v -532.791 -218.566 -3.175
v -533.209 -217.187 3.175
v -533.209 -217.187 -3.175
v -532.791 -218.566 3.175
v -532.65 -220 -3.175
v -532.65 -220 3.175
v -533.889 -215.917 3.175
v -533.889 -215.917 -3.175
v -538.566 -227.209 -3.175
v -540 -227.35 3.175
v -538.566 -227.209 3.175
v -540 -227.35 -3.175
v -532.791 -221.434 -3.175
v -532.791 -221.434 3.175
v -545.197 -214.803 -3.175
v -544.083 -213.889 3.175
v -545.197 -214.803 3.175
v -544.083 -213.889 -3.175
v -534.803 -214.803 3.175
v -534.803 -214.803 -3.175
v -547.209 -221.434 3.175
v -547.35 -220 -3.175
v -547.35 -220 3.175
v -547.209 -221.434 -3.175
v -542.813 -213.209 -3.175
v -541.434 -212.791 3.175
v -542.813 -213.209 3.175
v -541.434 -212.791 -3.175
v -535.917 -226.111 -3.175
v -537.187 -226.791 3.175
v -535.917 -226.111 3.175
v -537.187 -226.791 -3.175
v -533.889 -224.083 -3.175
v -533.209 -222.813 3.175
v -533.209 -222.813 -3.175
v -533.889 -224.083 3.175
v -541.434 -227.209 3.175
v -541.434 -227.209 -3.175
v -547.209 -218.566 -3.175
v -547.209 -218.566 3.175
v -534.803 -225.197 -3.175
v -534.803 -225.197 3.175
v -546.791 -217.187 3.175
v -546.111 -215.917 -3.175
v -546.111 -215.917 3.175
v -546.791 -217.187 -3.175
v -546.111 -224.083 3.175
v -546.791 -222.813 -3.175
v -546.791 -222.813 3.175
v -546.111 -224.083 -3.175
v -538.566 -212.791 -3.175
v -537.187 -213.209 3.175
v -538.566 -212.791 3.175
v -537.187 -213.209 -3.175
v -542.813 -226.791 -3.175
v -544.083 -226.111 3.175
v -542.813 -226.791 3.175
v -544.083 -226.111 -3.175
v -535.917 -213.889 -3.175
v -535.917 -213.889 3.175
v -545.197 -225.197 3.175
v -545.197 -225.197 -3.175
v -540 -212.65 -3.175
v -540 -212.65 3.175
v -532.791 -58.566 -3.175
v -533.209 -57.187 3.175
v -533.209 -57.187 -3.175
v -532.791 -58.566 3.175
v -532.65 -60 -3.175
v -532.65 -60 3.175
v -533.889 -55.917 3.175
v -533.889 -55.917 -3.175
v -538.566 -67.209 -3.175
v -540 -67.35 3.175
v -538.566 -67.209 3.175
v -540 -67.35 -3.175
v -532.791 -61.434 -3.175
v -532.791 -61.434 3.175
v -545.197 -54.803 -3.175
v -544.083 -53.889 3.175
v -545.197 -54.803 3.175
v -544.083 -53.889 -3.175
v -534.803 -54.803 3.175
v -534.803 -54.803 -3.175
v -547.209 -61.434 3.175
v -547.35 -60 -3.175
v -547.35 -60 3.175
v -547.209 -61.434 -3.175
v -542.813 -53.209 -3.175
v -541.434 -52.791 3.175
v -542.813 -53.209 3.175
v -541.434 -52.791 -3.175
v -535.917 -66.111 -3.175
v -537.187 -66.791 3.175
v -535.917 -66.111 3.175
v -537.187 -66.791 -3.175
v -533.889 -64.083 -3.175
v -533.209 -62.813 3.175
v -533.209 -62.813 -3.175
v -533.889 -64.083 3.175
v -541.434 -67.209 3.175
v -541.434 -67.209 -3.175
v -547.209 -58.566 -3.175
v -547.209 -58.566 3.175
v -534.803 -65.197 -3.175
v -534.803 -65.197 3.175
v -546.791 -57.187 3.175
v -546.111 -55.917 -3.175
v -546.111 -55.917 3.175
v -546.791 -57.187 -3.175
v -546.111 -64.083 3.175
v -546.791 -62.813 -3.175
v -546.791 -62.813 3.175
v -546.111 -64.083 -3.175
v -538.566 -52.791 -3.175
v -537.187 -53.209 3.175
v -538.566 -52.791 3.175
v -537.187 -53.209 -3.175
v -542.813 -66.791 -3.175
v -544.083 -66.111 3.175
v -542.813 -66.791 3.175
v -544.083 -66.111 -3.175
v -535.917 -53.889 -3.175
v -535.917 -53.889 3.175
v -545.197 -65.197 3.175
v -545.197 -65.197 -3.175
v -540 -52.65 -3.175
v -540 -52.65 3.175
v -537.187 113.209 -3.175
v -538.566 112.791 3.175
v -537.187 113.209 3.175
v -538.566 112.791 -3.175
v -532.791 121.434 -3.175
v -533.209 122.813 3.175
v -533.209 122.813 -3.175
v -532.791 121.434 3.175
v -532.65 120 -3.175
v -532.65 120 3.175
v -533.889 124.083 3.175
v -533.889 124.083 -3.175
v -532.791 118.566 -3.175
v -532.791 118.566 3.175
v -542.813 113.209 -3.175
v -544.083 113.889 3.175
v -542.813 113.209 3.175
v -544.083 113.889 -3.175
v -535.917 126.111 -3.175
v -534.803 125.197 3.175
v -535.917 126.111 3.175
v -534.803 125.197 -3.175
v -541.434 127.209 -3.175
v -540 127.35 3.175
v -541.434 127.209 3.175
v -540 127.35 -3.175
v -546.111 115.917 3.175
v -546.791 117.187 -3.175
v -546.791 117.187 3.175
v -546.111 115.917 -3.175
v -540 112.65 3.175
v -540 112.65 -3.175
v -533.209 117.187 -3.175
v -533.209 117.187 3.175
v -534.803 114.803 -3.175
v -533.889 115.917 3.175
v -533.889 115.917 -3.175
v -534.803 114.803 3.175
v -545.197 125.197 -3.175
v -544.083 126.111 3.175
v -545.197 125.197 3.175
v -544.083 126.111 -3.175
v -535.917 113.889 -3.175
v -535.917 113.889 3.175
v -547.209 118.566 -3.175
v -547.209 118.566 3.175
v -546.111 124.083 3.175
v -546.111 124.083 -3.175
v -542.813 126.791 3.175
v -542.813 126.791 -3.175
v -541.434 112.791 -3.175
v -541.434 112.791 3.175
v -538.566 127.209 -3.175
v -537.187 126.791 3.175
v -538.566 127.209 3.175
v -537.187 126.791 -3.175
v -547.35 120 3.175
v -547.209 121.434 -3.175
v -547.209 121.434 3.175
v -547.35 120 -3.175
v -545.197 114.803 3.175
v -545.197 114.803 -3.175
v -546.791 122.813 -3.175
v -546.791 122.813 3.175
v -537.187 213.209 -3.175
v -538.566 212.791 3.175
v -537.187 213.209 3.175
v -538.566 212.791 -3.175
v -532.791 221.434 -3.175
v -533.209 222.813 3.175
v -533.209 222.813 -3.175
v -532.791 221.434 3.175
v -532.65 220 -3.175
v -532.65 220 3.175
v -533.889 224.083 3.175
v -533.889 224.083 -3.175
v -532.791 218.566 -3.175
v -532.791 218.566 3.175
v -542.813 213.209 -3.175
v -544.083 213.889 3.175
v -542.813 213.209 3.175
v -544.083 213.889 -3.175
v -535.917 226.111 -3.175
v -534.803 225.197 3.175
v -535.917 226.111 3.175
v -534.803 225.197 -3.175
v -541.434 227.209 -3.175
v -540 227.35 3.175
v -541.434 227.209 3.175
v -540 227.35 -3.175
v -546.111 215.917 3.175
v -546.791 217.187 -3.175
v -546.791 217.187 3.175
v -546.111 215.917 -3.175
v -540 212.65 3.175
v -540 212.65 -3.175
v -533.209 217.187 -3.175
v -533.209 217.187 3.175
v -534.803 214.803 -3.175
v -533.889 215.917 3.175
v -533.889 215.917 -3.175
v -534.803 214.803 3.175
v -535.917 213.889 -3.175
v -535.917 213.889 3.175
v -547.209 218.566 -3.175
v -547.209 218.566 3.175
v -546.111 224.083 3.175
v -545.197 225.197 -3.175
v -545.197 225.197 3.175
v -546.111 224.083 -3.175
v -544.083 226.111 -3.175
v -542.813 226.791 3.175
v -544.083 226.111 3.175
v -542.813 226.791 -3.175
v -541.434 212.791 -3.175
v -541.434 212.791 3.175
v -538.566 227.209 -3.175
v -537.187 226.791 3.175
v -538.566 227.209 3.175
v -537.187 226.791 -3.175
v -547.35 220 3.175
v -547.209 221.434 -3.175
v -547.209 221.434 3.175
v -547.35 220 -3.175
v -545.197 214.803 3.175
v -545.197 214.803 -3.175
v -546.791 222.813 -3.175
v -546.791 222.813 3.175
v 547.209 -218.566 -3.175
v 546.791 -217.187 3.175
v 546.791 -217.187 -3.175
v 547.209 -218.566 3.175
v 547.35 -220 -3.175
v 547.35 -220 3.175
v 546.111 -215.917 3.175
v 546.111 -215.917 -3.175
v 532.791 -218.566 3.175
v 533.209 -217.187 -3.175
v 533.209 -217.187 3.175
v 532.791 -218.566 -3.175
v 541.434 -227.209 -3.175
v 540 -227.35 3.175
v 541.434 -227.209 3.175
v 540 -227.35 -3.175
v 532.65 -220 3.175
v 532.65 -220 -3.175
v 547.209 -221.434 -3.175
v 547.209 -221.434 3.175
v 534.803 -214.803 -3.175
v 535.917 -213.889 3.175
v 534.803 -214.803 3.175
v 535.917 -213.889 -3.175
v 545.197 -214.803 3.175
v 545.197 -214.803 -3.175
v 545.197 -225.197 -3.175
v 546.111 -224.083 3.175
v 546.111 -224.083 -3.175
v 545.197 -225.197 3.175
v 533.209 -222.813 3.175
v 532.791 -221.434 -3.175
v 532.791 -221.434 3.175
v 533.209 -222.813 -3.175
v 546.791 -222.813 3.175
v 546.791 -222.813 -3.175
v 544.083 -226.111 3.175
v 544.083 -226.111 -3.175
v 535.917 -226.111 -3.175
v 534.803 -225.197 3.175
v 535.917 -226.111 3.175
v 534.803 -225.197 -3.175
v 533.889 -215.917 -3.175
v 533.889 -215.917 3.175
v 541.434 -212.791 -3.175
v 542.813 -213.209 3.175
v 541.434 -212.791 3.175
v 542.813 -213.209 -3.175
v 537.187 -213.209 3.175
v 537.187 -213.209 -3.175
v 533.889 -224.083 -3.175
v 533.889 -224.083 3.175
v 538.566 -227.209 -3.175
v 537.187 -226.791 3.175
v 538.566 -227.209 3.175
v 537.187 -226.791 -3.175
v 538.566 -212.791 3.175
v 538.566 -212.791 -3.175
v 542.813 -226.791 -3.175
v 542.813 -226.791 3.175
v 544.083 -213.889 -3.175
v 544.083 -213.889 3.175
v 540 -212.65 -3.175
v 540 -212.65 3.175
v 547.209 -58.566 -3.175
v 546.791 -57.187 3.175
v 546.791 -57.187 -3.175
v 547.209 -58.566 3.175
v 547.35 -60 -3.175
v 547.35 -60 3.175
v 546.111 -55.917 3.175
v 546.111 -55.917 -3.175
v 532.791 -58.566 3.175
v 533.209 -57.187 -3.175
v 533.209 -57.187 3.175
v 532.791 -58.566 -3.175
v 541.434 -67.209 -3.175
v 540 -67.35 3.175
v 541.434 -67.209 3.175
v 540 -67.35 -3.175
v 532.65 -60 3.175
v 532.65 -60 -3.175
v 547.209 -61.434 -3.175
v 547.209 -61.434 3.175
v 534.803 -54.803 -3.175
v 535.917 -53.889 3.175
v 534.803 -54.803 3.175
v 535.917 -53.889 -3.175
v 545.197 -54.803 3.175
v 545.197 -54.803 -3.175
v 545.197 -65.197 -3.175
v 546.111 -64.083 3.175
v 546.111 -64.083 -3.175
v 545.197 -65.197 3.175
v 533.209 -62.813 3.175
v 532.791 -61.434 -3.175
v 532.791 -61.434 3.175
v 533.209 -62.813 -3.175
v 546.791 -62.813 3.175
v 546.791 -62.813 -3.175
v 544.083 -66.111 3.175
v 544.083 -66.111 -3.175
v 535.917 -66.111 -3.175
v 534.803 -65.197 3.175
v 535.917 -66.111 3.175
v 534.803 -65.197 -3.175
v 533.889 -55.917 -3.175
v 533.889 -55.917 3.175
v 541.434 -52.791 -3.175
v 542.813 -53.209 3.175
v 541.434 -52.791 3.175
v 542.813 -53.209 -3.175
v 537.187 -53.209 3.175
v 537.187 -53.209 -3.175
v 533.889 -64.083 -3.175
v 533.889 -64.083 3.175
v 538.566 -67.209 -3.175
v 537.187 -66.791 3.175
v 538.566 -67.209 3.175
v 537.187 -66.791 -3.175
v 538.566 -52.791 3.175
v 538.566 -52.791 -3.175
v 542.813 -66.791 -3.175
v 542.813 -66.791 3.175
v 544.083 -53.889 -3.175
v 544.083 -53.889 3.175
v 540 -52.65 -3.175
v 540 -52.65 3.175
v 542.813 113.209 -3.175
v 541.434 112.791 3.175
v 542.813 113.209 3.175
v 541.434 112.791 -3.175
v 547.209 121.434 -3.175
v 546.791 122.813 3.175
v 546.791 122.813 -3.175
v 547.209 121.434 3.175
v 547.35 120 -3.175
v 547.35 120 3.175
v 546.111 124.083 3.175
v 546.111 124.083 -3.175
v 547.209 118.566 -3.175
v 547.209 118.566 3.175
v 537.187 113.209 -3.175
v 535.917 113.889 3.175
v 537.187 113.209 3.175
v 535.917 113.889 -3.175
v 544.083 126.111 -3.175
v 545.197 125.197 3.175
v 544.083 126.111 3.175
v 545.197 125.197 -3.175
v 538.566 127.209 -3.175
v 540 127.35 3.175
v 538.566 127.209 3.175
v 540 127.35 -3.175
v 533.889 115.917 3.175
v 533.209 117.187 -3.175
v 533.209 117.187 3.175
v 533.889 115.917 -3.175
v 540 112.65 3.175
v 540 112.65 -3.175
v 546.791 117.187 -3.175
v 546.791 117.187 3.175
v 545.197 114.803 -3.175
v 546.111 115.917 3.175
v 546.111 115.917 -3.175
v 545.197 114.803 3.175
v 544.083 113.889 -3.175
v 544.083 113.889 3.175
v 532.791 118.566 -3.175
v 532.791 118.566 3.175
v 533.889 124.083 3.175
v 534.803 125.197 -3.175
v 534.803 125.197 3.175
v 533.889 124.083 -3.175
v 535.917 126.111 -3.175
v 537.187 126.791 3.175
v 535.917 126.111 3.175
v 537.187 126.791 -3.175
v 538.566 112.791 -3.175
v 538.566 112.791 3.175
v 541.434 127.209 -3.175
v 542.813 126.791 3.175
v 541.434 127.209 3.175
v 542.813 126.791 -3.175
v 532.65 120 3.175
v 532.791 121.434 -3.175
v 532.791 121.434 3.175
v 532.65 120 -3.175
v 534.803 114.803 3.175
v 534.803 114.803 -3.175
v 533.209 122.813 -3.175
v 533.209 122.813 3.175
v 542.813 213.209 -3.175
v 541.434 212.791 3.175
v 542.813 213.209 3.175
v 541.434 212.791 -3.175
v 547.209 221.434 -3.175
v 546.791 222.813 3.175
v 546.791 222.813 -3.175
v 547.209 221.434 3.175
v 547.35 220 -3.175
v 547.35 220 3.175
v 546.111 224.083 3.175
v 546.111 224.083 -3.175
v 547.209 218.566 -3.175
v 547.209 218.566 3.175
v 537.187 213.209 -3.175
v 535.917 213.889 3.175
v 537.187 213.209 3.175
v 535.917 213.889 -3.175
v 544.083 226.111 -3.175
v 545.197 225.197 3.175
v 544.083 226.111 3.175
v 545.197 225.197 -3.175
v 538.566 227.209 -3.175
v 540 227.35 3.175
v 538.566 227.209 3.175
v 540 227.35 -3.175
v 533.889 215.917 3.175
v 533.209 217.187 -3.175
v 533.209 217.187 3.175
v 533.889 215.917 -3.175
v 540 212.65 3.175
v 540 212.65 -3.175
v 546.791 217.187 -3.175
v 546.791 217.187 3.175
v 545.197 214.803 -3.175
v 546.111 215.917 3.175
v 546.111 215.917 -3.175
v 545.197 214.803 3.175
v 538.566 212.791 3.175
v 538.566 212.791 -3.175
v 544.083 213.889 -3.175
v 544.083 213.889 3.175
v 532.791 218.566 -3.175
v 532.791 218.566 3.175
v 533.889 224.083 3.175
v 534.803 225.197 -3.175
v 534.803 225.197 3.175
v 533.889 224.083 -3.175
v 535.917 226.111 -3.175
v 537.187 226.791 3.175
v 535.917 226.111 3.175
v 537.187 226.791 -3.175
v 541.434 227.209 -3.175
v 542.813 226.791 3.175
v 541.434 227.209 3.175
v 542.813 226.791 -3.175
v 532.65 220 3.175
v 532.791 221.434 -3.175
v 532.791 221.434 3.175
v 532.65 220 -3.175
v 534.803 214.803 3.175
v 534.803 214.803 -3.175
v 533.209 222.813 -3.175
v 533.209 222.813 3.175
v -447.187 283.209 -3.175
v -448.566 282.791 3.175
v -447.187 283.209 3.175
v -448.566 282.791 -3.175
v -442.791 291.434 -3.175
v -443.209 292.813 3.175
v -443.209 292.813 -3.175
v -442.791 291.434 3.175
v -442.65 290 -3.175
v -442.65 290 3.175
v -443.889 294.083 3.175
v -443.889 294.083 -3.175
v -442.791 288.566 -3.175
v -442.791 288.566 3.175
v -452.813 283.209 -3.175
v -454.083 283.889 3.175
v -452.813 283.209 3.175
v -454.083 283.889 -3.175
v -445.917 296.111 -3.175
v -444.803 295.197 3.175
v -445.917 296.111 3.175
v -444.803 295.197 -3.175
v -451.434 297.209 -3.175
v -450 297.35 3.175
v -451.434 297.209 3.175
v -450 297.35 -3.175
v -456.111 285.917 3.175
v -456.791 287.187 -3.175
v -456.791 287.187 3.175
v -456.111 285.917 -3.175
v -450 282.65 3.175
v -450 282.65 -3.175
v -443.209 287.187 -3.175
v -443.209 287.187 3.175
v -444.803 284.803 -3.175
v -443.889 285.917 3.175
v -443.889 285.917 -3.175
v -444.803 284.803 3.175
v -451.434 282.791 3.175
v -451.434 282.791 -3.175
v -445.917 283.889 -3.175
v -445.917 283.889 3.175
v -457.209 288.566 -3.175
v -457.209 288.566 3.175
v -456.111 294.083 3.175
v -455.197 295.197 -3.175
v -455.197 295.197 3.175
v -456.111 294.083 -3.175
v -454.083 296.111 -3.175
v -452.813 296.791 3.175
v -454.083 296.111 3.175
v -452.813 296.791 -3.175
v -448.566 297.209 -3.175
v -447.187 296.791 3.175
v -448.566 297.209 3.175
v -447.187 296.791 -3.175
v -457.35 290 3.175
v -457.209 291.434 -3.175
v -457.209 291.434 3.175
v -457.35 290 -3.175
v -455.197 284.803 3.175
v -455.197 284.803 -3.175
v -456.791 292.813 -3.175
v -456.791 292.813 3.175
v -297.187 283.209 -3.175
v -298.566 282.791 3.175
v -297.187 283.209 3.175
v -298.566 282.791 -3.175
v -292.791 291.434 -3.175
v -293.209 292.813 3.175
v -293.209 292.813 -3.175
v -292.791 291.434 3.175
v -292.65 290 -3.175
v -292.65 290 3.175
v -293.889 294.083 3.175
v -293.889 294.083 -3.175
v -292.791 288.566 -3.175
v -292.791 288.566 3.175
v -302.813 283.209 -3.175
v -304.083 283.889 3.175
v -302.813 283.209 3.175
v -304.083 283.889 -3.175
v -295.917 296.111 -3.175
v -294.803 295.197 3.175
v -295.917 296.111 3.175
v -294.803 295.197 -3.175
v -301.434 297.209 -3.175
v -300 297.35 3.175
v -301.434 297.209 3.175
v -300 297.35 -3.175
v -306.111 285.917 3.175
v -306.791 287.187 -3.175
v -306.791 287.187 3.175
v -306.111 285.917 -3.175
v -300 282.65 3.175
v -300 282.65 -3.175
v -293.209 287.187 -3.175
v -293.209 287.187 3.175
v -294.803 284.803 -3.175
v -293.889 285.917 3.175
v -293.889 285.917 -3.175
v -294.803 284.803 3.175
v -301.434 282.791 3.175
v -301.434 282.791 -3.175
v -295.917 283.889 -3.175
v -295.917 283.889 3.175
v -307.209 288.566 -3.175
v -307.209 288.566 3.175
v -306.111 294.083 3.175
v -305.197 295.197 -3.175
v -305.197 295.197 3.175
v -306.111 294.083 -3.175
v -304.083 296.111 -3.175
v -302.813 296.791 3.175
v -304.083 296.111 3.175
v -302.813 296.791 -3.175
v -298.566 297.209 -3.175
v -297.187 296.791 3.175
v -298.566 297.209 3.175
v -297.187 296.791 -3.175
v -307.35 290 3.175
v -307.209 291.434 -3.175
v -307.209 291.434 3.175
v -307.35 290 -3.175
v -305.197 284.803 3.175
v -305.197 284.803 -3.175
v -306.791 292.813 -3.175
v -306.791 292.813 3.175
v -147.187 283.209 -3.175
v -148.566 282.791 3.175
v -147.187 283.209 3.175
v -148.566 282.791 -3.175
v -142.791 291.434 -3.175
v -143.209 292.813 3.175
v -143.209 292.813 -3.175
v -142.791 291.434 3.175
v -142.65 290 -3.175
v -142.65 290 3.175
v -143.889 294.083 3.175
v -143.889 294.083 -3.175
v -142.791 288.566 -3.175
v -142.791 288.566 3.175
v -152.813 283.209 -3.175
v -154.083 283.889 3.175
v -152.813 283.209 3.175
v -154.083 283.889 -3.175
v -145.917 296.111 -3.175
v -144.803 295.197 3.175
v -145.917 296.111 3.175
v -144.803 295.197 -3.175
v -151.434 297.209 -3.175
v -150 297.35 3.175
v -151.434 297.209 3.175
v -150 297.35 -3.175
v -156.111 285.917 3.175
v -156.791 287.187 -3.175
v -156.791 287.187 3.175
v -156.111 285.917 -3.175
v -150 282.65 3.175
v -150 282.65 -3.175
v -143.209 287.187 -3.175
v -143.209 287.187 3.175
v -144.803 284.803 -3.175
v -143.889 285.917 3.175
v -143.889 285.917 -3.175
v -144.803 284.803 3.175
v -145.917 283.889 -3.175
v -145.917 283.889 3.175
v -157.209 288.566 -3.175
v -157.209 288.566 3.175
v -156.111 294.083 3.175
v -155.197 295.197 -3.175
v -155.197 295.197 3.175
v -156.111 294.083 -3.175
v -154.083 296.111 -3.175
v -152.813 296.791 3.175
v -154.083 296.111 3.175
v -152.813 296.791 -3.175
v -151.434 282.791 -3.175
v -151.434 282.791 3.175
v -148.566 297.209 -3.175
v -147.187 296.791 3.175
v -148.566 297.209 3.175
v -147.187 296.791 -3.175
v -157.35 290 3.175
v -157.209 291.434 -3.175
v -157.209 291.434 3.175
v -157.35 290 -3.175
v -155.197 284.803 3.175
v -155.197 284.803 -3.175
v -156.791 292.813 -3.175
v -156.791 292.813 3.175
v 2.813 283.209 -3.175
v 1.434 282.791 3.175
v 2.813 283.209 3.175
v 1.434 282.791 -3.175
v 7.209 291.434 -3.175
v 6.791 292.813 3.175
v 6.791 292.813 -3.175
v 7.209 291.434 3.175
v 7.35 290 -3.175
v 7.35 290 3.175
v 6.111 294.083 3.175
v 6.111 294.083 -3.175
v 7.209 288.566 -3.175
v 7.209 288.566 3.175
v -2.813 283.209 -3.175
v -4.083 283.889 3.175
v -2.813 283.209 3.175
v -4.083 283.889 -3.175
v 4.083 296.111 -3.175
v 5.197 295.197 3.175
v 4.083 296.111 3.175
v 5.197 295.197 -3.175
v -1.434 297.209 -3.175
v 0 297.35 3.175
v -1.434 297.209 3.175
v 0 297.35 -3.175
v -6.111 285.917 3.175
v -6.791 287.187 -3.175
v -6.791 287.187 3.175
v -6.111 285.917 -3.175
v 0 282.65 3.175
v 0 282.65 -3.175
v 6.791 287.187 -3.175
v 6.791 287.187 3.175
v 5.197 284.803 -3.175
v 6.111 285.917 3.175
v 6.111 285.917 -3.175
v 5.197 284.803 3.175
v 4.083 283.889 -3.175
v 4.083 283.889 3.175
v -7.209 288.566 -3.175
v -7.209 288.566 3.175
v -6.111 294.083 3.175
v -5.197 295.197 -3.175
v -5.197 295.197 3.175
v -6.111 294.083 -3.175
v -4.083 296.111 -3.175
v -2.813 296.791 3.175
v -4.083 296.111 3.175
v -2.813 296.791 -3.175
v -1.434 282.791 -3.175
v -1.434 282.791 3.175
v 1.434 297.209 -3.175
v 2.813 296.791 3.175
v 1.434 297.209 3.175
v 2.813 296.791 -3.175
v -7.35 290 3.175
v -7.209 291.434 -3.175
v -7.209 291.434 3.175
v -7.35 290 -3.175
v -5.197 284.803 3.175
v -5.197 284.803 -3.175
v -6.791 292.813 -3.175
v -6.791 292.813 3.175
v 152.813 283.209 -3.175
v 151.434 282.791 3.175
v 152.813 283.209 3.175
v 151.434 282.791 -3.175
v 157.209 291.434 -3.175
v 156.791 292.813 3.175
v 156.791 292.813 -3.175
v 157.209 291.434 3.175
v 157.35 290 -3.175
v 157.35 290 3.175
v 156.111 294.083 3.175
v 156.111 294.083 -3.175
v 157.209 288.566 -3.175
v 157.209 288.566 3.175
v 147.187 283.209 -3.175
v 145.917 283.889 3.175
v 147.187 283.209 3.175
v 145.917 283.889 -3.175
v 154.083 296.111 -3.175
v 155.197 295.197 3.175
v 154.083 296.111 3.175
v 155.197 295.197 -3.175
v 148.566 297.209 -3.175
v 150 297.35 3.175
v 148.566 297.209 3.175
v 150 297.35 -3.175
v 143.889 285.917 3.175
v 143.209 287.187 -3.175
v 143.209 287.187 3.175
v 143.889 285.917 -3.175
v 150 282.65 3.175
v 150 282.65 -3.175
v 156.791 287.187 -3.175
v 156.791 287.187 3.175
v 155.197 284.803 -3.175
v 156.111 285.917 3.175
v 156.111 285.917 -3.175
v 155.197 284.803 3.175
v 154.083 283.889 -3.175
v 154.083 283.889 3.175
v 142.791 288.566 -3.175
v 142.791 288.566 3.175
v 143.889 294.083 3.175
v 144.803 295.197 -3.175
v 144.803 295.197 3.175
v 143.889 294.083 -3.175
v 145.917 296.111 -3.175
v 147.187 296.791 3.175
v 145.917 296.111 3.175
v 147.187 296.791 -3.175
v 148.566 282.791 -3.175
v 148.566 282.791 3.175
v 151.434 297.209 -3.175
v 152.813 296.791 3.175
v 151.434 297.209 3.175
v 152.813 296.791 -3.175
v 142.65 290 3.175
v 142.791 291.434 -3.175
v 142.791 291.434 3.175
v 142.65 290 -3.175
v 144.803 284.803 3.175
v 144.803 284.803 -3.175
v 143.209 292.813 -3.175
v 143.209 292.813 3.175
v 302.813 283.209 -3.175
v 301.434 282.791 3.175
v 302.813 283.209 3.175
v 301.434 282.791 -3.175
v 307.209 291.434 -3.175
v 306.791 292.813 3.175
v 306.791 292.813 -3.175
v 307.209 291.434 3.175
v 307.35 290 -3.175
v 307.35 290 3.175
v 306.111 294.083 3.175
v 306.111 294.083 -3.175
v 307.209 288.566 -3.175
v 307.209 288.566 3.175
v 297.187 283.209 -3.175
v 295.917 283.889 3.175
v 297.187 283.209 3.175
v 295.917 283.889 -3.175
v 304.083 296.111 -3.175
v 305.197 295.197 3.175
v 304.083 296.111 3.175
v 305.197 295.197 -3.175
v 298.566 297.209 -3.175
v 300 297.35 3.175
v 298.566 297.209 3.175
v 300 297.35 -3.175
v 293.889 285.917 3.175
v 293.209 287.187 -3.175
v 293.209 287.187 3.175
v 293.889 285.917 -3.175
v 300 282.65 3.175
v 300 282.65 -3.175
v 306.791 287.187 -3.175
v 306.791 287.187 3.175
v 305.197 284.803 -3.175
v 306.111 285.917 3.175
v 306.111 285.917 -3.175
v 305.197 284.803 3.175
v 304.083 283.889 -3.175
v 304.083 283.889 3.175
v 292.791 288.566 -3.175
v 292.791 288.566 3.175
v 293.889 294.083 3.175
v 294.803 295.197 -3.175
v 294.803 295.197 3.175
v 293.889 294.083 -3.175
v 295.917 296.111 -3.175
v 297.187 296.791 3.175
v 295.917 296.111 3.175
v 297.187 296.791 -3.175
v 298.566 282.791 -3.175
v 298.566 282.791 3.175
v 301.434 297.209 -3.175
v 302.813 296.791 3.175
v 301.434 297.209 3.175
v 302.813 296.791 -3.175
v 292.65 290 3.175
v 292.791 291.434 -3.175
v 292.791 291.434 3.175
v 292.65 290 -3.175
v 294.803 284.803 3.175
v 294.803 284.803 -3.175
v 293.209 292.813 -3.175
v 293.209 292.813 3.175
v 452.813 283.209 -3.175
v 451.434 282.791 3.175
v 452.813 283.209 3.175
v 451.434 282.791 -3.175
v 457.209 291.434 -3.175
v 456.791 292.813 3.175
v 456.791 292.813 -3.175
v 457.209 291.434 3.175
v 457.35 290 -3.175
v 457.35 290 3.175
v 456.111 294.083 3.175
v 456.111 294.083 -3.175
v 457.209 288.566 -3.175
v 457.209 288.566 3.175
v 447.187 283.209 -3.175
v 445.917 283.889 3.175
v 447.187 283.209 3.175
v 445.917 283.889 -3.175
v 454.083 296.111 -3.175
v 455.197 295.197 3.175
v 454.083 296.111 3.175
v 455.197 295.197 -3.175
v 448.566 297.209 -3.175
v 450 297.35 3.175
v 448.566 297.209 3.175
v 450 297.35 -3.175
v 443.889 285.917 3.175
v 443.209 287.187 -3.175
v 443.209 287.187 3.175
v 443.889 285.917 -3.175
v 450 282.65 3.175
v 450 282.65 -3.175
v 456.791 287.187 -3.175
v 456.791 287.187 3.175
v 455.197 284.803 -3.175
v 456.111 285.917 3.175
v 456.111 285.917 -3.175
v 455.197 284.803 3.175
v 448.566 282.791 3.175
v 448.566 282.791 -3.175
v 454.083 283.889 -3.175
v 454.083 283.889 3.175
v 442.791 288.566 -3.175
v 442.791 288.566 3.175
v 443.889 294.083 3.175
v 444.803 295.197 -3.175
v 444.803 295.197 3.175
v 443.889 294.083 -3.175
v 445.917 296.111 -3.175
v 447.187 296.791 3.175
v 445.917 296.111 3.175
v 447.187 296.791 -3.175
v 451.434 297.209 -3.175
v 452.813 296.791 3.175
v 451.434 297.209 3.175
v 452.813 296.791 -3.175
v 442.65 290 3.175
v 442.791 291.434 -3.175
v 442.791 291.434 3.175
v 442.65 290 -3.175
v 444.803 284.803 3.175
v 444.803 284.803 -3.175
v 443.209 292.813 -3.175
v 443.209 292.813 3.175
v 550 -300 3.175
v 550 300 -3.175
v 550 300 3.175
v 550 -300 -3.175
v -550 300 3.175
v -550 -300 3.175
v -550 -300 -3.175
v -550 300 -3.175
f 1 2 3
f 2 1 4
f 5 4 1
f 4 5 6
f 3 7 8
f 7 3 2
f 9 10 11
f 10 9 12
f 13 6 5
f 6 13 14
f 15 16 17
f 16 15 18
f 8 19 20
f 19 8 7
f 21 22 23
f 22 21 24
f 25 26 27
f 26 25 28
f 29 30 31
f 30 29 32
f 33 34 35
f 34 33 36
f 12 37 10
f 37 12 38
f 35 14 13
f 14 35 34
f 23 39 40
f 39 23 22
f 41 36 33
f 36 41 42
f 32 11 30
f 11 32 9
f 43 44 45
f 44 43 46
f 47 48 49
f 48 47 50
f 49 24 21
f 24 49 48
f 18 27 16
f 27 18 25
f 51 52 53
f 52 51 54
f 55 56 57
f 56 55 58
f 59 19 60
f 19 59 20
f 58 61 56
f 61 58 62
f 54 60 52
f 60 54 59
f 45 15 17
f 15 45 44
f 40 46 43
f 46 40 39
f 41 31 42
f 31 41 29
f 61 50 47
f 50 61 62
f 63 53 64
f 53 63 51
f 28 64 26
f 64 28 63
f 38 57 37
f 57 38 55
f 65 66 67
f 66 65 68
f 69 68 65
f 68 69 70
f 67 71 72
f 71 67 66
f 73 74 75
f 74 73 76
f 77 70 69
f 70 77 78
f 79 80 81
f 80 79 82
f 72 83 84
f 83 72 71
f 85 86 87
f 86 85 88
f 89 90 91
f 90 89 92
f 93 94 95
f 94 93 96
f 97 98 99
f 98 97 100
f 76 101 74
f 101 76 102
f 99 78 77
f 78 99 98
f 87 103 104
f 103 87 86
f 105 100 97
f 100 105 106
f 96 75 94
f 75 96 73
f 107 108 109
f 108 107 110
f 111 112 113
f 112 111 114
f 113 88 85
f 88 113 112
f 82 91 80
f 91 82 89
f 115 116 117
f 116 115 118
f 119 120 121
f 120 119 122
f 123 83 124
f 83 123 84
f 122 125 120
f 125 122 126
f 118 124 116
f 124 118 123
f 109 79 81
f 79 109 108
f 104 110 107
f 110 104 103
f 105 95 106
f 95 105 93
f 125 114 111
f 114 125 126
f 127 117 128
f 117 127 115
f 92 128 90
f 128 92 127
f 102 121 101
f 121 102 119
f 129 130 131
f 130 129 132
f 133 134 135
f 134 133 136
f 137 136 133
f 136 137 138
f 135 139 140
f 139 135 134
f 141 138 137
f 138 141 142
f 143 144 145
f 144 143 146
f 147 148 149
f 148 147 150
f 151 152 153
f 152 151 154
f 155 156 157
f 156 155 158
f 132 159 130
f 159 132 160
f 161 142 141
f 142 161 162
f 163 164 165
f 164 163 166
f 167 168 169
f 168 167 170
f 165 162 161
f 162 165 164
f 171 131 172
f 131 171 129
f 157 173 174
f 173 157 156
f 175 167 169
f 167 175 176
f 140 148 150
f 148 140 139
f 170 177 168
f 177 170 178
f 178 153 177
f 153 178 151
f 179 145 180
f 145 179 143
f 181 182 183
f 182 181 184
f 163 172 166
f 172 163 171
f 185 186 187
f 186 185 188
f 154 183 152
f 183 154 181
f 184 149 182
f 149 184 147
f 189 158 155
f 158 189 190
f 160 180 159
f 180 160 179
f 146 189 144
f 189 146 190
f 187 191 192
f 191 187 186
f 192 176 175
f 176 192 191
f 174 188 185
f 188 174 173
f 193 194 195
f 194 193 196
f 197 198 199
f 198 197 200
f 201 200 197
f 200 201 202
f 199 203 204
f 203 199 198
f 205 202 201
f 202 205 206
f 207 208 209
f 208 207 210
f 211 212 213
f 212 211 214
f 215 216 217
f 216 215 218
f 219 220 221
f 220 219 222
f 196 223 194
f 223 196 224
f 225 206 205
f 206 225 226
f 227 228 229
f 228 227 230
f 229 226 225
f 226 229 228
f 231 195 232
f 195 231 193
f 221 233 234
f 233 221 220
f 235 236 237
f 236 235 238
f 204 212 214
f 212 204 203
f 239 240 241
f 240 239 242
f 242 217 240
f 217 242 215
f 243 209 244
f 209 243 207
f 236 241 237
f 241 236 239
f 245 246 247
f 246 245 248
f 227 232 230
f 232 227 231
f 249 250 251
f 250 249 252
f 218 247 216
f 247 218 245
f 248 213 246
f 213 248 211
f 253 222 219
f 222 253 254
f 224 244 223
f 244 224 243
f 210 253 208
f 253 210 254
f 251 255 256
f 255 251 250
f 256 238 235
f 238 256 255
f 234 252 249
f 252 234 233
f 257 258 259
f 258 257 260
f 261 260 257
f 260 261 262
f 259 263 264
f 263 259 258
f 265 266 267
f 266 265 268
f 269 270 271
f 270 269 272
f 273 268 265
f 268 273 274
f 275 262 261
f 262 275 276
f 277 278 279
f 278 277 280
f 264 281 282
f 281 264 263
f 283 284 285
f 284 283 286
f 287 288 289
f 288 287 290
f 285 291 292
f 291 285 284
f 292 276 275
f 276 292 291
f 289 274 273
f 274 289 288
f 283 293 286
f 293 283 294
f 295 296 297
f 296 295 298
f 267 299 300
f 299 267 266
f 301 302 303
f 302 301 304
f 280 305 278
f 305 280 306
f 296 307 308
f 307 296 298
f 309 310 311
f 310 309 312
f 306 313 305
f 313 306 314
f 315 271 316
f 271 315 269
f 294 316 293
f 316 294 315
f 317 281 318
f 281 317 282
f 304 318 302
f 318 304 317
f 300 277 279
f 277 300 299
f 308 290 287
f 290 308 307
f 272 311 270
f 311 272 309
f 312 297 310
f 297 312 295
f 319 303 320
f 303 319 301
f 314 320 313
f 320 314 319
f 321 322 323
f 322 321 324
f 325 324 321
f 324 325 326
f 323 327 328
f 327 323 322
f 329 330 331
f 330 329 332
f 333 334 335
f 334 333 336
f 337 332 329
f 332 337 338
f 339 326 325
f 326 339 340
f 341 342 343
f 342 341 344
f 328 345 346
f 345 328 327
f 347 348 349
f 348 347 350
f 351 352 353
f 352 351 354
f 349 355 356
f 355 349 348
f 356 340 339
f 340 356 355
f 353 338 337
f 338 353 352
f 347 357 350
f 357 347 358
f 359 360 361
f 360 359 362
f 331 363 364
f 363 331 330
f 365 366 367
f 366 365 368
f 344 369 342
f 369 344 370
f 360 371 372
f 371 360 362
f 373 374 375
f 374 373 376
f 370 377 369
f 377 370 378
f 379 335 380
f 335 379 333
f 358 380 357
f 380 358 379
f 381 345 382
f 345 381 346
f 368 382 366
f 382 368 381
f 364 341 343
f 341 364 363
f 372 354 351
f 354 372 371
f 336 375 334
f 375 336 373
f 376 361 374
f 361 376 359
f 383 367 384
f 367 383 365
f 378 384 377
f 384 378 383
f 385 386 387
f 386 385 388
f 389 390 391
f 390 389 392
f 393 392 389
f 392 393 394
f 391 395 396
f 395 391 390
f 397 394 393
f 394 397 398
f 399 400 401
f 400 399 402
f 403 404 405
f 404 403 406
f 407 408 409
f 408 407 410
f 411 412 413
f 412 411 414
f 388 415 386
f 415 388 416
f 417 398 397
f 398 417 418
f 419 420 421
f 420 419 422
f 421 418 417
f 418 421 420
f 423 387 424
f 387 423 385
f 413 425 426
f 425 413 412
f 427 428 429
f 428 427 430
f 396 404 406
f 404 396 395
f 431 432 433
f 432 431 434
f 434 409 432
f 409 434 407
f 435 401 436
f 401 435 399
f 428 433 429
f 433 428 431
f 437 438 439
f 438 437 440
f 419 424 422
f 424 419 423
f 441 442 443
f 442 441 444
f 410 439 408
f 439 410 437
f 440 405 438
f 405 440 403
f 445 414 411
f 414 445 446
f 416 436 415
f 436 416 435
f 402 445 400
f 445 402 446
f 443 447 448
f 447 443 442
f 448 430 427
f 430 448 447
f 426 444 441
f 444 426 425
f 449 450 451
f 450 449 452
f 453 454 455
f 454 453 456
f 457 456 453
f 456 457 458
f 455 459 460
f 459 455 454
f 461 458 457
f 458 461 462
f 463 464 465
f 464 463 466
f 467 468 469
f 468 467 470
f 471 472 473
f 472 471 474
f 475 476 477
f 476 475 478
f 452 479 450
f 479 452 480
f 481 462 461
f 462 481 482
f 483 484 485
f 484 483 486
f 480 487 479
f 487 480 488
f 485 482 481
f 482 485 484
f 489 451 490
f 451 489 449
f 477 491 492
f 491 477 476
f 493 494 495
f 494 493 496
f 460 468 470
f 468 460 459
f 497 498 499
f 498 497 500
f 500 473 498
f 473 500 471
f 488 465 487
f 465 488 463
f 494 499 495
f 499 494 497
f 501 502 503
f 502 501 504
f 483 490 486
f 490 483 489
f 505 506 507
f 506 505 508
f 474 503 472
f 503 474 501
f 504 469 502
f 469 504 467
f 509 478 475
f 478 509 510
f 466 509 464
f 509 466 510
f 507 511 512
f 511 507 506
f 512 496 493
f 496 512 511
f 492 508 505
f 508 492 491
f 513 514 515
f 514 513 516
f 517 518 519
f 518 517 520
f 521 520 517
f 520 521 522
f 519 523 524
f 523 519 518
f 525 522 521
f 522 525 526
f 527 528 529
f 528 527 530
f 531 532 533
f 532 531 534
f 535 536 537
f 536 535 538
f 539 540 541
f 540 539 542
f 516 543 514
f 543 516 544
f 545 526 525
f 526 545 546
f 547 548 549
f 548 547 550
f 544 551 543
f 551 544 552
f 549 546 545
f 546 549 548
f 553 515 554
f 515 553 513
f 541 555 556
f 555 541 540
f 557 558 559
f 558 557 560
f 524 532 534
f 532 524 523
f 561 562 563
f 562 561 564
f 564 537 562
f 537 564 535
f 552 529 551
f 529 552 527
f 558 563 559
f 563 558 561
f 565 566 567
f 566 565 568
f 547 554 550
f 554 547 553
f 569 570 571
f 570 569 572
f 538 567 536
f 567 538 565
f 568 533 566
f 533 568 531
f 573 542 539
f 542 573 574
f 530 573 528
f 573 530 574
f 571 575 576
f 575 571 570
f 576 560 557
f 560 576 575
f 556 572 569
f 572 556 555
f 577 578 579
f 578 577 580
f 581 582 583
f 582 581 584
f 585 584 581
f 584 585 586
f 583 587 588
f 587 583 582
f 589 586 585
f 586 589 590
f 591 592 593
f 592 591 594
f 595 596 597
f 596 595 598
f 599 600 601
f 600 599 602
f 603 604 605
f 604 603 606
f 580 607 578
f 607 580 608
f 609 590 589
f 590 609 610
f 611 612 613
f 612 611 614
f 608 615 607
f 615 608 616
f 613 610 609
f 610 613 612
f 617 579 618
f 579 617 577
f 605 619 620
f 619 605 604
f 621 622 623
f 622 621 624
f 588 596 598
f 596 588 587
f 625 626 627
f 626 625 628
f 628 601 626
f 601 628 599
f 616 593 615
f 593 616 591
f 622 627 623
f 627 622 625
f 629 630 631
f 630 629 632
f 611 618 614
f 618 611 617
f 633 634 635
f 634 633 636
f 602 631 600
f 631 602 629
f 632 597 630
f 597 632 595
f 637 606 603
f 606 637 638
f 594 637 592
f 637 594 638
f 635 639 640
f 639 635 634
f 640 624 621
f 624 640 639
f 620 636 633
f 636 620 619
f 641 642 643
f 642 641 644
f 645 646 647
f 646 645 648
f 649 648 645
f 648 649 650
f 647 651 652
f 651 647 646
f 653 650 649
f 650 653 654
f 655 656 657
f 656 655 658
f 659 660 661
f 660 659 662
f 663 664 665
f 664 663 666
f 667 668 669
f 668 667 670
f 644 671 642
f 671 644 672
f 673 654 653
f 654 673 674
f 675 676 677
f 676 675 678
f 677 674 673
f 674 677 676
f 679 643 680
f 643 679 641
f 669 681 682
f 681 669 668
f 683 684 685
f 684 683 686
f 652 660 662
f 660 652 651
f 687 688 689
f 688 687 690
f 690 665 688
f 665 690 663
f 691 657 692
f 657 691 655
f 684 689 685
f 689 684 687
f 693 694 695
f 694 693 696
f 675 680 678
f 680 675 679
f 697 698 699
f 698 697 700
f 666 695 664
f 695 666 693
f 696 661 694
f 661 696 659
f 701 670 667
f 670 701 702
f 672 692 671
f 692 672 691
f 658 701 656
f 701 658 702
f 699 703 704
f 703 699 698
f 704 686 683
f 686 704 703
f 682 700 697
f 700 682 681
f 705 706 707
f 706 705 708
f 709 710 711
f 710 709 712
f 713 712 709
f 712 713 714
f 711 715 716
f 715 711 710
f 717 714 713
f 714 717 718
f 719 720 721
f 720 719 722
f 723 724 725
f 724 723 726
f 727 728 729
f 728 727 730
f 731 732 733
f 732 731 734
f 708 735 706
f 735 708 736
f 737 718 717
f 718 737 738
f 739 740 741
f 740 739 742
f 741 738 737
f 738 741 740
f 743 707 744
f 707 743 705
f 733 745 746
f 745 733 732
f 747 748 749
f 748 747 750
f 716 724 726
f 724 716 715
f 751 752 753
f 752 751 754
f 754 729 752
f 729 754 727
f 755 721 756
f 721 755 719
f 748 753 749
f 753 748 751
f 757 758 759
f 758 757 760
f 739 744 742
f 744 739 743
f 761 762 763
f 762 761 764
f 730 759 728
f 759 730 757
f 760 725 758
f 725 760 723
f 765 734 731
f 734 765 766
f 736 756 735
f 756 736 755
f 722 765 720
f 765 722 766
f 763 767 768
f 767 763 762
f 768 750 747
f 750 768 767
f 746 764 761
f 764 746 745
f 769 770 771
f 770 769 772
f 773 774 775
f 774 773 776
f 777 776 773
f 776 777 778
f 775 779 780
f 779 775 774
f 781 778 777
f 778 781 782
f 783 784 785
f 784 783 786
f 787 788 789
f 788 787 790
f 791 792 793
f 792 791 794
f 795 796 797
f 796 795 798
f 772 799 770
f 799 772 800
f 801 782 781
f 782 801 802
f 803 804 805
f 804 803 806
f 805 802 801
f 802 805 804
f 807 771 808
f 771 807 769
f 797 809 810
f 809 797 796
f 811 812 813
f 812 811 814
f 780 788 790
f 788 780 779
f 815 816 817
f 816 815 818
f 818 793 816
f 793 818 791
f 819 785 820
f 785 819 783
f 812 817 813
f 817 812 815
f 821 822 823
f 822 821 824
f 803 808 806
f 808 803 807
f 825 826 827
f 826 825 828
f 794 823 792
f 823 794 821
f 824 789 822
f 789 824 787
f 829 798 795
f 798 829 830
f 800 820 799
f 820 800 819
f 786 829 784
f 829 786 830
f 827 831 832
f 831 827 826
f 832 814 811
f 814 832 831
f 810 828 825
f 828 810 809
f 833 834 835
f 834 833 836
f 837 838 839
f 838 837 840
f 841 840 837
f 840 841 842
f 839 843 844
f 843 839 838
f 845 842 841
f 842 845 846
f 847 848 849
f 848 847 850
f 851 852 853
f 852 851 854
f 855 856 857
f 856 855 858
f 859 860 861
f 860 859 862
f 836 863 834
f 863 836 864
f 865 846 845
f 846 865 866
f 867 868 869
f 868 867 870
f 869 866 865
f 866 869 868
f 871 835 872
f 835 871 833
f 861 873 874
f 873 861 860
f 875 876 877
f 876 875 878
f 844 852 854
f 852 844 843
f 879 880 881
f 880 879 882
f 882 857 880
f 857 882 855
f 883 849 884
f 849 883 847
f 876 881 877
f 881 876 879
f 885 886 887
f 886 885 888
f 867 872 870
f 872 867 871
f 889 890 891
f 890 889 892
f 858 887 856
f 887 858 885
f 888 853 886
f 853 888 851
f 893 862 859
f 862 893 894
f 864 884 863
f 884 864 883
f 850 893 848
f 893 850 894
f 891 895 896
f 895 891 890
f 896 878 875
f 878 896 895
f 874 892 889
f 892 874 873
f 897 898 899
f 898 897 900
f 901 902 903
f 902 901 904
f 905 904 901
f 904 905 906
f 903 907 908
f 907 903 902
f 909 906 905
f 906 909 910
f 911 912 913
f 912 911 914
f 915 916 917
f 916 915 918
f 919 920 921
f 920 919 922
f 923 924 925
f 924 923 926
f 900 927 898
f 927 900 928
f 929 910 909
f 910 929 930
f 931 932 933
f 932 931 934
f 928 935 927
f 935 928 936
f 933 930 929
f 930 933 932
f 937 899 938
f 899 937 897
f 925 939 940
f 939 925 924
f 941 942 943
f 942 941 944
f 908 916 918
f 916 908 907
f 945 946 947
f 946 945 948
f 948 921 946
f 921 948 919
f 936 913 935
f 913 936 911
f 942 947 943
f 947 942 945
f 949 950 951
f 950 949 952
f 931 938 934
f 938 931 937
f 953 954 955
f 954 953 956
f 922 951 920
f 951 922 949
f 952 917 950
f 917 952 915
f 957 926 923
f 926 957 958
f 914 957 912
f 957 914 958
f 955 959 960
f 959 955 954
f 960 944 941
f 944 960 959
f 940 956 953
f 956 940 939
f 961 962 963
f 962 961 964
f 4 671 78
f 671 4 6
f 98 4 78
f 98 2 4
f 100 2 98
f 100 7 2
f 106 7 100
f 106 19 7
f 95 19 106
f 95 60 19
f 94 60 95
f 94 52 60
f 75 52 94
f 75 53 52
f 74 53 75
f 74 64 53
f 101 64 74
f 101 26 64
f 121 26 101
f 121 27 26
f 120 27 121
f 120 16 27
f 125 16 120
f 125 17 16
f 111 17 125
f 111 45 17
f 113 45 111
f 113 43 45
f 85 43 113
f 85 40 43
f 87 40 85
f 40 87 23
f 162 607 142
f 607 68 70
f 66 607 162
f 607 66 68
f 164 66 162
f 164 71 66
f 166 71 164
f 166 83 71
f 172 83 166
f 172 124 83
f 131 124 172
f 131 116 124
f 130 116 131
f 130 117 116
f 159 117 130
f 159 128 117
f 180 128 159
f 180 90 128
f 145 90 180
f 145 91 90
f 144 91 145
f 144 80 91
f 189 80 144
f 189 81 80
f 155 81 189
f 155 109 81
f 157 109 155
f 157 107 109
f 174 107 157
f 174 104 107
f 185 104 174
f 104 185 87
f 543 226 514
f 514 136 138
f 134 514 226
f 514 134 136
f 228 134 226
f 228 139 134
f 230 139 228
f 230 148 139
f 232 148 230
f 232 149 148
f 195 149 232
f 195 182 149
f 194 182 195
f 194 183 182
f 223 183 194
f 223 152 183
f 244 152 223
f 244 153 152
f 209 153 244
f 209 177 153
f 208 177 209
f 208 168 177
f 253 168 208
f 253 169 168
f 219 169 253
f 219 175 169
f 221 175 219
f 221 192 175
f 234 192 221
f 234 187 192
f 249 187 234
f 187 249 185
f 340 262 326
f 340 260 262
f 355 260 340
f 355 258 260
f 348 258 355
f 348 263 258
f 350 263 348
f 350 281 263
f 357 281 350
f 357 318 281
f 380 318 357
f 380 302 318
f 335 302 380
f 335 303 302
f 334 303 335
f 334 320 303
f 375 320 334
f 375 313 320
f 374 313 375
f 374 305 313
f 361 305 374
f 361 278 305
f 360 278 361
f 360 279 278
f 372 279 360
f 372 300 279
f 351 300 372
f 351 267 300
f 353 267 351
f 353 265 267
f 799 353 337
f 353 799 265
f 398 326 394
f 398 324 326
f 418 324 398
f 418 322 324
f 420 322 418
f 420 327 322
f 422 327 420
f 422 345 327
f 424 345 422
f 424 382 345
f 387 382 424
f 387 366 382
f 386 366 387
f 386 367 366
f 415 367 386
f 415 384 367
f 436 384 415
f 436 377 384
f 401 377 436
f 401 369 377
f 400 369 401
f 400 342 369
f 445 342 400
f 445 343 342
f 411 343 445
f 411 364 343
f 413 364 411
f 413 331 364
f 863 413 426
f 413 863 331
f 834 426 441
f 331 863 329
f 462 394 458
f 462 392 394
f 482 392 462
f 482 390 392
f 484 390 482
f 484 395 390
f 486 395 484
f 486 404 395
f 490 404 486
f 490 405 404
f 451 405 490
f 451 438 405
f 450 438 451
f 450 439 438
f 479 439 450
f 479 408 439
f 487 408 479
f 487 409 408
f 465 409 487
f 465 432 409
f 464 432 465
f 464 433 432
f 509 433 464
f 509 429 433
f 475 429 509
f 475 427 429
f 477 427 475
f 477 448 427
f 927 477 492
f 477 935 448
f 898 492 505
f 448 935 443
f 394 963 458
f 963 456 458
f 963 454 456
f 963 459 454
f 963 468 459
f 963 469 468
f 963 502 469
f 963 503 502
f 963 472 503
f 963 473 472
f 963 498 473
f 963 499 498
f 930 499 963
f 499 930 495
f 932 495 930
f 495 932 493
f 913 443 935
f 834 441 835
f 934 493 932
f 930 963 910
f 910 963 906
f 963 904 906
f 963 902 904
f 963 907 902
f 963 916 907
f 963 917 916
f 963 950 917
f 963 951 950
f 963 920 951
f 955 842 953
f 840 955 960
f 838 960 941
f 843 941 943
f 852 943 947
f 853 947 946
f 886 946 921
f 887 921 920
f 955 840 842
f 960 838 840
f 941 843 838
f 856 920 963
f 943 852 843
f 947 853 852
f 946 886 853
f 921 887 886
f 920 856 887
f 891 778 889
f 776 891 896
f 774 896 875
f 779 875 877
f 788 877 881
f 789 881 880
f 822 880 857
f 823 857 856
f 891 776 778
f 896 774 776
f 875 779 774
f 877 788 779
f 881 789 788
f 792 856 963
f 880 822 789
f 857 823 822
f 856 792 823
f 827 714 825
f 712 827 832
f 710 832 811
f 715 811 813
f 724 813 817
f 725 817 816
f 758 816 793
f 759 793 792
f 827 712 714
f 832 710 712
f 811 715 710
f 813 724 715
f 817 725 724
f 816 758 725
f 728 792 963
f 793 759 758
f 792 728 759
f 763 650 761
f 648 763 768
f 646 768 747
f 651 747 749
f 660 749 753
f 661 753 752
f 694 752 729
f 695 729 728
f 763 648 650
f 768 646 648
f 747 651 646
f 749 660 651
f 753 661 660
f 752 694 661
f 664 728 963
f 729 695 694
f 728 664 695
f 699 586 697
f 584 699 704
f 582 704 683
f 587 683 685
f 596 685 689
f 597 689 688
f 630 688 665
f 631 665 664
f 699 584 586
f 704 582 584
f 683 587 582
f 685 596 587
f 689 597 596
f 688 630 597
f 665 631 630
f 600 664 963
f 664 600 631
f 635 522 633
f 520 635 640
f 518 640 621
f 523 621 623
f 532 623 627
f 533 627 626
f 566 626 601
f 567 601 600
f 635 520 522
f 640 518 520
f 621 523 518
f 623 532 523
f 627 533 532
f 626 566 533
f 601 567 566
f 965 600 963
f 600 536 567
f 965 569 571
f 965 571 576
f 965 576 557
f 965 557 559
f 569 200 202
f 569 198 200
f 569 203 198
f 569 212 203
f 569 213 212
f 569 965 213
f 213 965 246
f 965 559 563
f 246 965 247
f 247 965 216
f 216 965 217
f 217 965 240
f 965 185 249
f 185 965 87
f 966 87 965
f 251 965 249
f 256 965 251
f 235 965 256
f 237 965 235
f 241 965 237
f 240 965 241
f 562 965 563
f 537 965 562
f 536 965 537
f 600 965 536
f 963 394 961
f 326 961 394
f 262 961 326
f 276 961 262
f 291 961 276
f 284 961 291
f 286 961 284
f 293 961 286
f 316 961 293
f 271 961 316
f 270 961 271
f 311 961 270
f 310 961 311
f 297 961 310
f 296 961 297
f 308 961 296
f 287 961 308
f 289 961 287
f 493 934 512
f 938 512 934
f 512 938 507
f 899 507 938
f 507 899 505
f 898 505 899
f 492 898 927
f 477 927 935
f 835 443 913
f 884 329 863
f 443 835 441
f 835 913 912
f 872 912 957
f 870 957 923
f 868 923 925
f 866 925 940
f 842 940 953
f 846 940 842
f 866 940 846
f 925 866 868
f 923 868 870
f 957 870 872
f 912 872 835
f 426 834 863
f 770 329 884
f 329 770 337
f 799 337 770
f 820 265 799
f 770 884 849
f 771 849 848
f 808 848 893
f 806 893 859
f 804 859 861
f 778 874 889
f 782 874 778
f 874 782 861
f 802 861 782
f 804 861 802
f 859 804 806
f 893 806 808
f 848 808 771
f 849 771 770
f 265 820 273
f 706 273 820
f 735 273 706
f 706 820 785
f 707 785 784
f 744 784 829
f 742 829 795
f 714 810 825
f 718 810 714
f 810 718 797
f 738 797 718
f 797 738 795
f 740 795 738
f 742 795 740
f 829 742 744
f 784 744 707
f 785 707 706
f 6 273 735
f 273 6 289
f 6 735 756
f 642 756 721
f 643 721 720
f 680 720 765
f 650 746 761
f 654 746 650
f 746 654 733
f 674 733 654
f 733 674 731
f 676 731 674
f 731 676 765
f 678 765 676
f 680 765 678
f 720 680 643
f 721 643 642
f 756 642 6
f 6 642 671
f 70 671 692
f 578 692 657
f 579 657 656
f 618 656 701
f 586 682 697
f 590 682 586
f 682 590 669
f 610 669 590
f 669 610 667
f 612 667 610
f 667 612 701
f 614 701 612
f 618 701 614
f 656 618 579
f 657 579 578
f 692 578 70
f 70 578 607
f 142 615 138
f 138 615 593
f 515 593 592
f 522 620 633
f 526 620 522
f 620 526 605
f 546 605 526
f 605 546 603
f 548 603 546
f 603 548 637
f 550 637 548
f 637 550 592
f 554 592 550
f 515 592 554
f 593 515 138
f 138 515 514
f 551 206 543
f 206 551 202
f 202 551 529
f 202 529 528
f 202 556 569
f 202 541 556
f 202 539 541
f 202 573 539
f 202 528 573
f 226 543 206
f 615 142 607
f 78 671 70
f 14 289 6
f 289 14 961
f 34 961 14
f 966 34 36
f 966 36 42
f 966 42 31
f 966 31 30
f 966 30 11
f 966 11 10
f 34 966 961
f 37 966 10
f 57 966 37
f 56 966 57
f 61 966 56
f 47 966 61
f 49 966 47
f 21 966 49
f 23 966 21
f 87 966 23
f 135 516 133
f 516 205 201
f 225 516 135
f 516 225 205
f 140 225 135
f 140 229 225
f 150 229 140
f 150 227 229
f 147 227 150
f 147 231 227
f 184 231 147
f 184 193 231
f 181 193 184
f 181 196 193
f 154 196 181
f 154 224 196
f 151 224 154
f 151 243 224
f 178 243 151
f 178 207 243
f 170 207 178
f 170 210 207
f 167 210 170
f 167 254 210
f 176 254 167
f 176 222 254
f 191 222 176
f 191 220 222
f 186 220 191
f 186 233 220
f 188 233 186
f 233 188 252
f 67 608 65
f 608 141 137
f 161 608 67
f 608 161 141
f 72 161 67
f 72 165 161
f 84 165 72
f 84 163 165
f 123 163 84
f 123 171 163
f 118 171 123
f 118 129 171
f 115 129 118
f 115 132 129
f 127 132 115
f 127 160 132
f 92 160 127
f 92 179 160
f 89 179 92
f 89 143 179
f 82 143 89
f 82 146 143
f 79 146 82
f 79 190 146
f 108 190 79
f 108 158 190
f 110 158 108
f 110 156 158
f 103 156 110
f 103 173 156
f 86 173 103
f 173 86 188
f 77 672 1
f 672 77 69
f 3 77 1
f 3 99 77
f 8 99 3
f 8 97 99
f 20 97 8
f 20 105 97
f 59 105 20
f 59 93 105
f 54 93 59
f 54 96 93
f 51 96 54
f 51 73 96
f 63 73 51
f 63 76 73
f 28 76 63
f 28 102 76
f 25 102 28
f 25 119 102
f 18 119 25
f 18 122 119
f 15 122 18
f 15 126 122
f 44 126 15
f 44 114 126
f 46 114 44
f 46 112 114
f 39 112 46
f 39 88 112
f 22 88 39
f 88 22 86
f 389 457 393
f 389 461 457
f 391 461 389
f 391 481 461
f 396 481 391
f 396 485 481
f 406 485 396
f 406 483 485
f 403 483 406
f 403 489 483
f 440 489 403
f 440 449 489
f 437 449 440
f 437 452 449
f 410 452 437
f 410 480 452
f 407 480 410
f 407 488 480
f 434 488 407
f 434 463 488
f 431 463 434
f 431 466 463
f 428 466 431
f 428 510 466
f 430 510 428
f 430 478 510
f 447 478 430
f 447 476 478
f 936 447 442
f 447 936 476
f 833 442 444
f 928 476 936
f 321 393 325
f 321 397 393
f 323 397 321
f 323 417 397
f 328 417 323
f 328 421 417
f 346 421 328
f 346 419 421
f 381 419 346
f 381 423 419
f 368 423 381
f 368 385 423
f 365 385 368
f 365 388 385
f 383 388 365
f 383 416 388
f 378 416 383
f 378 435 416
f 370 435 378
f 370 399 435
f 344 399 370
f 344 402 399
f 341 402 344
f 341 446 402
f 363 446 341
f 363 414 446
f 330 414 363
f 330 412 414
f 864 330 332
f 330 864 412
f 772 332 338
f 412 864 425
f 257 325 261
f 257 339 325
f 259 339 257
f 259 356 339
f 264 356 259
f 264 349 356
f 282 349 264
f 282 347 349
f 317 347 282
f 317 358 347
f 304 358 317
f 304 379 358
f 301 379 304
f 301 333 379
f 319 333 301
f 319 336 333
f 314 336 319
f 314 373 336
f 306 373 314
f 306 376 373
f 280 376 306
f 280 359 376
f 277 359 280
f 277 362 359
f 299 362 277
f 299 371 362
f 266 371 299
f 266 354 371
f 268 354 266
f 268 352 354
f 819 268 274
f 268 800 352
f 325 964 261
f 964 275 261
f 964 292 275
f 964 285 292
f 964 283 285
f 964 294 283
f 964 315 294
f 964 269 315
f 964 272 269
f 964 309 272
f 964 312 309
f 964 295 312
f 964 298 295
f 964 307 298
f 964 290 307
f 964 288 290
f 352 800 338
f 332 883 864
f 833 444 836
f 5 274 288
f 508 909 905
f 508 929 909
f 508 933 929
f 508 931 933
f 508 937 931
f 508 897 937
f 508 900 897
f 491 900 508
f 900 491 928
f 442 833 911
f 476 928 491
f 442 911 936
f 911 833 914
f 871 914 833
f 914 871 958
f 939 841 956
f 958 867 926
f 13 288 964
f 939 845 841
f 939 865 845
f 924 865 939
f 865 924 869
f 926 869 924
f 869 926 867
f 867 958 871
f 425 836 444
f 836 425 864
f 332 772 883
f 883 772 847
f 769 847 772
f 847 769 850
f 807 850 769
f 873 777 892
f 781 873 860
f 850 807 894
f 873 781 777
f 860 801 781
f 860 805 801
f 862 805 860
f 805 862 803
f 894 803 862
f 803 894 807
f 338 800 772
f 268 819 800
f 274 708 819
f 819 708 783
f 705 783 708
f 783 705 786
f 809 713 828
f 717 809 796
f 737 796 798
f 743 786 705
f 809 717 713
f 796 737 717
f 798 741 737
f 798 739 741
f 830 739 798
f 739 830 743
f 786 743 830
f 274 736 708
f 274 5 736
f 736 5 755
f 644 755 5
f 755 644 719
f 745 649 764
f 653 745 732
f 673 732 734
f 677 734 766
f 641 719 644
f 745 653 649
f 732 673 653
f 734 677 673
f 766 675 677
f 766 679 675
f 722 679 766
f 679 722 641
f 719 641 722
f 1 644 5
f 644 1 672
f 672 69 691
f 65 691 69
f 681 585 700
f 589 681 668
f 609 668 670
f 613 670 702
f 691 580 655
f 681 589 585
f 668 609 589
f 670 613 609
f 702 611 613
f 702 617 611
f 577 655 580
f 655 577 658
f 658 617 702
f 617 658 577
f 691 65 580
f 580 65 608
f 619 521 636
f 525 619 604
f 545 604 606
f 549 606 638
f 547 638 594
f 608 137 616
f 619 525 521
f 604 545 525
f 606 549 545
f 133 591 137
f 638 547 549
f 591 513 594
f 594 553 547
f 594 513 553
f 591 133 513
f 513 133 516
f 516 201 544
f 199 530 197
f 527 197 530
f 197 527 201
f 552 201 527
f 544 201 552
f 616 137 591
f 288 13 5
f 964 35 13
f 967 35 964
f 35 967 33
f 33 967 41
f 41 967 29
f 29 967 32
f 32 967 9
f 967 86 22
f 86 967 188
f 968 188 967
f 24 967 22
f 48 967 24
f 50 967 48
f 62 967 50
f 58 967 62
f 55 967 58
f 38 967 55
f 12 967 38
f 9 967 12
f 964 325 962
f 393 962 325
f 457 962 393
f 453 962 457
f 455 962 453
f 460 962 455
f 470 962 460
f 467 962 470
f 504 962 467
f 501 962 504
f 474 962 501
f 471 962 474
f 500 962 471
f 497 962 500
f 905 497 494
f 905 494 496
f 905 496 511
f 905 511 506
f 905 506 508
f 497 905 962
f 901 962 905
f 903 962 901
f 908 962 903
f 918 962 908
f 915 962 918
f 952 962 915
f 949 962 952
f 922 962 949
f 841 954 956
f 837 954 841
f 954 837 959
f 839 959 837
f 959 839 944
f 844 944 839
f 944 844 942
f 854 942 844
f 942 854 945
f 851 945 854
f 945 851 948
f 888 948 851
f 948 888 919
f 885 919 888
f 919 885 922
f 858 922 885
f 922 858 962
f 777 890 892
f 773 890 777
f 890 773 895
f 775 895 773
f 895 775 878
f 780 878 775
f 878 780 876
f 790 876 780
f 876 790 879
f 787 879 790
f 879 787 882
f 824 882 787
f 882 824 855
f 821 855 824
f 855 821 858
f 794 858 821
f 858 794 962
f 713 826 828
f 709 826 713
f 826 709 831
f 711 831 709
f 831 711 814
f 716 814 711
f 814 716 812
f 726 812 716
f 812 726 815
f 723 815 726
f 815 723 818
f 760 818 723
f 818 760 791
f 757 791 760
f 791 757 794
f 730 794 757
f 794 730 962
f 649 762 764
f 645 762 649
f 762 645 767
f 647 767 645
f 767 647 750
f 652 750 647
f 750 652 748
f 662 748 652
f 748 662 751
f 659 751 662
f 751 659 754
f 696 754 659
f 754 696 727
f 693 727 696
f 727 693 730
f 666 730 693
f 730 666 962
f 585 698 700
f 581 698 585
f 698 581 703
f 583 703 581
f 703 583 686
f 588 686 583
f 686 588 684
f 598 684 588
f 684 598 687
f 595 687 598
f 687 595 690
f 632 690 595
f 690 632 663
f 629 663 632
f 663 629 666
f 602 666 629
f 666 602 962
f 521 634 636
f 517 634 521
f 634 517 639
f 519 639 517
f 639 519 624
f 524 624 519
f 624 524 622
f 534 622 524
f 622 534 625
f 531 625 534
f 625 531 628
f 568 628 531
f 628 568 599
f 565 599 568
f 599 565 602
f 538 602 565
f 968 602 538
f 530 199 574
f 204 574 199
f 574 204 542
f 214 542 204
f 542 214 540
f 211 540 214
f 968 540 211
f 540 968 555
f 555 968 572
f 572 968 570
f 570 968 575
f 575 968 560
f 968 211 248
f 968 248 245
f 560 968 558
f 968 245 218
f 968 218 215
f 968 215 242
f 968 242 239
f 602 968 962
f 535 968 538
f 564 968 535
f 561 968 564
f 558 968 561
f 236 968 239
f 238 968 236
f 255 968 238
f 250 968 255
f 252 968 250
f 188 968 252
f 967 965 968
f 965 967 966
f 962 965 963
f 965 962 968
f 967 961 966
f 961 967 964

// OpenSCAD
// bucket_bottom.scad
// Bucket bottom plate for LifeTrac v25
// CNC cut from 1/4" plate steel

include <../lifetrac_v25_params.scad>

module bucket_bottom() {
    difference() {
        // Main plate
        cube([BUCKET_WIDTH, BUCKET_DEPTH, PLATE_1_4_INCH], center=true);
        
        // Edge mounting holes for sides (4 per side)
        for (side = [-1, 1]) {
            x_pos = side * (BUCKET_WIDTH/2 - 10);
            for (y = [-BUCKET_DEPTH/2+80, -BUCKET_DEPTH/2+BUCKET_DEPTH*0.4, -BUCKET_DEPTH/2+BUCKET_DEPTH*0.7, BUCKET_DEPTH/2-80]) {
                translate([x_pos, y, 0])
                cylinder(d=BOLT_DIA_1_2 + 2, h=PLATE_1_4_INCH+4, center=true, $fn=32);
            }
        }
        
        // Back edge mounting holes for quick attach
        for (x = [-BUCKET_WIDTH/2+100 : 150 : BUCKET_WIDTH/2-100]) {
            translate([x, BUCKET_DEPTH/2-10, 0])
            cylinder(d=BOLT_DIA_1_2 + 2, h=PLATE_1_4_INCH+4, center=true, $fn=32);
        }
    }
}

// Render the part for preview/export
if ($preview || len(search("bucket_bottom.scad", parent_modules())) == 0) {
    bucket_bottom();
}
